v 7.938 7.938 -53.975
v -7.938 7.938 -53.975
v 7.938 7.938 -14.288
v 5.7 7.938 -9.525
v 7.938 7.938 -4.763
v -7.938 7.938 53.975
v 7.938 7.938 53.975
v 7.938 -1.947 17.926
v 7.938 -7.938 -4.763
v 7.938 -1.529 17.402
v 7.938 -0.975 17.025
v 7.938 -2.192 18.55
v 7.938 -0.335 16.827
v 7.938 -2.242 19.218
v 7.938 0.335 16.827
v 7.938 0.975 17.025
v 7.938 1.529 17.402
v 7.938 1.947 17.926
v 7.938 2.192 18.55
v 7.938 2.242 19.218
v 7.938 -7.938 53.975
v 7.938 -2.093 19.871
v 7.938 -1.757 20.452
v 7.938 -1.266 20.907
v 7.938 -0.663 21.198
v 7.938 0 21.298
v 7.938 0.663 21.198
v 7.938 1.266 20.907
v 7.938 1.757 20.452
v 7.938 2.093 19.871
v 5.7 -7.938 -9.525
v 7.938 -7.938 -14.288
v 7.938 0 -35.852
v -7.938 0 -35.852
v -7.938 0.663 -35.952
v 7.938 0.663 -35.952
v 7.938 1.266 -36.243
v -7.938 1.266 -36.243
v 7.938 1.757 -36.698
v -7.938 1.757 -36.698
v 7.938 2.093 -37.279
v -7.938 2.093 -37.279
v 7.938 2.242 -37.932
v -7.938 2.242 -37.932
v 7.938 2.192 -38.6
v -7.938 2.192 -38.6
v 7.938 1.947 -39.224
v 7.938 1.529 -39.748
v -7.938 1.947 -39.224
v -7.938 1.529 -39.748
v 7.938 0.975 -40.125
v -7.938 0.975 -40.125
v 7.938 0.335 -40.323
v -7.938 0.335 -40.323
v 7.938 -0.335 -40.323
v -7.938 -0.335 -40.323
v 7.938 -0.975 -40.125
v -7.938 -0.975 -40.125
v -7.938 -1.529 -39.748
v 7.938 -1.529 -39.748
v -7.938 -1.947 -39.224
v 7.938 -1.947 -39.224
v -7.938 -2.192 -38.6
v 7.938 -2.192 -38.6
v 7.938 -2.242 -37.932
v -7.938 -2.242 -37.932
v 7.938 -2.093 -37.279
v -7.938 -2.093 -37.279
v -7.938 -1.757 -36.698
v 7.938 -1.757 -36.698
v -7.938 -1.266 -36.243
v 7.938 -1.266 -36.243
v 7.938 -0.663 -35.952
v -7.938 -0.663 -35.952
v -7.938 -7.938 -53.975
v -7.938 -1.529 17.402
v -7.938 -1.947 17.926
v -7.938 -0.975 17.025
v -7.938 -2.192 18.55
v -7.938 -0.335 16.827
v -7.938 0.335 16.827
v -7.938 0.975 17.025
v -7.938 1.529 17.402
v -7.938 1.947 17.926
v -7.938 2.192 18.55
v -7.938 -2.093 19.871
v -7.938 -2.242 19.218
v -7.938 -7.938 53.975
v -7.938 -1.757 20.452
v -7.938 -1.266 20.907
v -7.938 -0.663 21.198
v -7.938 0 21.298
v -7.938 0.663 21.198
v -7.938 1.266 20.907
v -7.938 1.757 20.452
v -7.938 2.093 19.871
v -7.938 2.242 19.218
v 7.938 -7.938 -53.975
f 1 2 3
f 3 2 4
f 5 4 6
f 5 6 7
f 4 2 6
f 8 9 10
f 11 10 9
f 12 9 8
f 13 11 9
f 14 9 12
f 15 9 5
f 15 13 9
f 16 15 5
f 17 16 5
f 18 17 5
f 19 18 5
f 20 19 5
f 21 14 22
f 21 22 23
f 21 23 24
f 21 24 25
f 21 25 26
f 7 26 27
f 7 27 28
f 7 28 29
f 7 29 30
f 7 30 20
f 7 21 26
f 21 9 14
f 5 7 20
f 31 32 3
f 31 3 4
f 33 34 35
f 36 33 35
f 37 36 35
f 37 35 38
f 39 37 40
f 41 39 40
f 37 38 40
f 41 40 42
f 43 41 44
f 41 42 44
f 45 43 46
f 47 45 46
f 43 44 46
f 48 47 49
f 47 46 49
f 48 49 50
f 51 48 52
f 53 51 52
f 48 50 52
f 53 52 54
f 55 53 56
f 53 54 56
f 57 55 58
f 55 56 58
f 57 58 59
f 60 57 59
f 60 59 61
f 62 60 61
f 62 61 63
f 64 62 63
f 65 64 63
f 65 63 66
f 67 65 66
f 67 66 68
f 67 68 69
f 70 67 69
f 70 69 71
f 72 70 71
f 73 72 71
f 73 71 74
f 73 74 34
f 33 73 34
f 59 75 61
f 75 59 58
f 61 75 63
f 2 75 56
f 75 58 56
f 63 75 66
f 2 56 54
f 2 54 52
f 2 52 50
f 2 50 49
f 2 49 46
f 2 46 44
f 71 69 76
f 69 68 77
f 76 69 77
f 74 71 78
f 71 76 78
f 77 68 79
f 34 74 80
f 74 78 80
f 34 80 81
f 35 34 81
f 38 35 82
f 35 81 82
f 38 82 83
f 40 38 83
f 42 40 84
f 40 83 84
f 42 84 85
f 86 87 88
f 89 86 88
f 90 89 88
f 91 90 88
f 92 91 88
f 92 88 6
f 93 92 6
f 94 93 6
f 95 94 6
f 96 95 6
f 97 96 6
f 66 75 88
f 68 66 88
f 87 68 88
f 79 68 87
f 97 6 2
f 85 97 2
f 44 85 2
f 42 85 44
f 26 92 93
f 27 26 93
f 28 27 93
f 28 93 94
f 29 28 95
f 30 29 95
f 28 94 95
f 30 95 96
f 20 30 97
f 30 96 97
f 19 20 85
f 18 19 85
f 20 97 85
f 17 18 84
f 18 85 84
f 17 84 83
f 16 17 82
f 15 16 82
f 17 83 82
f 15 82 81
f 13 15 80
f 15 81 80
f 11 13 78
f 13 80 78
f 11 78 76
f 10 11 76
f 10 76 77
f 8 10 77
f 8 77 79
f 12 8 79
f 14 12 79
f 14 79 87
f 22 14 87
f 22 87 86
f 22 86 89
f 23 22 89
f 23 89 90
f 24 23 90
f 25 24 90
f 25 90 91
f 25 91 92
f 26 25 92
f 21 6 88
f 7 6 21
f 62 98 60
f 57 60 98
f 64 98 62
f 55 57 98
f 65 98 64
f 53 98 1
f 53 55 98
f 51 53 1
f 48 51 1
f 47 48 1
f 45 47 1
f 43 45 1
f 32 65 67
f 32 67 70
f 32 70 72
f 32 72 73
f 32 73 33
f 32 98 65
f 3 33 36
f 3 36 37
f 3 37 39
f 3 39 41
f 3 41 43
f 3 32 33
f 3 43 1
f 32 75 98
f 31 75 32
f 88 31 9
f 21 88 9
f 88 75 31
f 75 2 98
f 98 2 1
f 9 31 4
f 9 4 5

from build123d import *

# Parameters (mm, degrees)
SKETCH1_W               = 15.875
SKETCH1_H               = 15.875
BOSS_EXTRUDE1_DEPTH     = 53.975
CUT_EXTRUDE1_DEPTH      = 57.818308284
CUT_EXTRUDE1_DEPTH_BACK = 57.818308284
F_12_24_TAPPED_HOLE1_D  = 4.4958


with BuildPart() as part:
    # Sketch1 → Boss-Extrude1 (new, symmetric)
    with BuildSketch(Plane.XY):
        Rectangle(SKETCH1_W, SKETCH1_H)
    extrude(amount=BOSS_EXTRUDE1_DEPTH, both=True)

    # Sketch2 → Cut-Extrude1 (cut, two sides: drawn at the far end of the back side and taken through both)
    with BuildSketch(Plane(origin=(0, 7.9375, 0), x_dir=(1, 0, 0), z_dir=(0, 1, 0)).offset(-CUT_EXTRUDE1_DEPTH_BACK)):
        Polygon((71.794217754, 150.202262663), (7.9375, 14.2875), (5.699938661, 9.525), (7.9375, 4.7625), (71.794217754, -131.152262663), (372.130716448, -131.152262663), (372.130716448, 150.202262663), align=None)
    extrude(amount=CUT_EXTRUDE1_DEPTH + CUT_EXTRUDE1_DEPTH_BACK, mode=Mode.SUBTRACT)

    # #12-24 Tapped Hole1 (through all)
    with Locations(Plane(origin=(7.9375, 0, 0), x_dir=(0, 0, -1), z_dir=(1, 0, 0))):
        with Locations((38.1, 0), (-19.05, 0)):
            Hole(F_12_24_TAPPED_HOLE1_D / 2)


solid = part.part
